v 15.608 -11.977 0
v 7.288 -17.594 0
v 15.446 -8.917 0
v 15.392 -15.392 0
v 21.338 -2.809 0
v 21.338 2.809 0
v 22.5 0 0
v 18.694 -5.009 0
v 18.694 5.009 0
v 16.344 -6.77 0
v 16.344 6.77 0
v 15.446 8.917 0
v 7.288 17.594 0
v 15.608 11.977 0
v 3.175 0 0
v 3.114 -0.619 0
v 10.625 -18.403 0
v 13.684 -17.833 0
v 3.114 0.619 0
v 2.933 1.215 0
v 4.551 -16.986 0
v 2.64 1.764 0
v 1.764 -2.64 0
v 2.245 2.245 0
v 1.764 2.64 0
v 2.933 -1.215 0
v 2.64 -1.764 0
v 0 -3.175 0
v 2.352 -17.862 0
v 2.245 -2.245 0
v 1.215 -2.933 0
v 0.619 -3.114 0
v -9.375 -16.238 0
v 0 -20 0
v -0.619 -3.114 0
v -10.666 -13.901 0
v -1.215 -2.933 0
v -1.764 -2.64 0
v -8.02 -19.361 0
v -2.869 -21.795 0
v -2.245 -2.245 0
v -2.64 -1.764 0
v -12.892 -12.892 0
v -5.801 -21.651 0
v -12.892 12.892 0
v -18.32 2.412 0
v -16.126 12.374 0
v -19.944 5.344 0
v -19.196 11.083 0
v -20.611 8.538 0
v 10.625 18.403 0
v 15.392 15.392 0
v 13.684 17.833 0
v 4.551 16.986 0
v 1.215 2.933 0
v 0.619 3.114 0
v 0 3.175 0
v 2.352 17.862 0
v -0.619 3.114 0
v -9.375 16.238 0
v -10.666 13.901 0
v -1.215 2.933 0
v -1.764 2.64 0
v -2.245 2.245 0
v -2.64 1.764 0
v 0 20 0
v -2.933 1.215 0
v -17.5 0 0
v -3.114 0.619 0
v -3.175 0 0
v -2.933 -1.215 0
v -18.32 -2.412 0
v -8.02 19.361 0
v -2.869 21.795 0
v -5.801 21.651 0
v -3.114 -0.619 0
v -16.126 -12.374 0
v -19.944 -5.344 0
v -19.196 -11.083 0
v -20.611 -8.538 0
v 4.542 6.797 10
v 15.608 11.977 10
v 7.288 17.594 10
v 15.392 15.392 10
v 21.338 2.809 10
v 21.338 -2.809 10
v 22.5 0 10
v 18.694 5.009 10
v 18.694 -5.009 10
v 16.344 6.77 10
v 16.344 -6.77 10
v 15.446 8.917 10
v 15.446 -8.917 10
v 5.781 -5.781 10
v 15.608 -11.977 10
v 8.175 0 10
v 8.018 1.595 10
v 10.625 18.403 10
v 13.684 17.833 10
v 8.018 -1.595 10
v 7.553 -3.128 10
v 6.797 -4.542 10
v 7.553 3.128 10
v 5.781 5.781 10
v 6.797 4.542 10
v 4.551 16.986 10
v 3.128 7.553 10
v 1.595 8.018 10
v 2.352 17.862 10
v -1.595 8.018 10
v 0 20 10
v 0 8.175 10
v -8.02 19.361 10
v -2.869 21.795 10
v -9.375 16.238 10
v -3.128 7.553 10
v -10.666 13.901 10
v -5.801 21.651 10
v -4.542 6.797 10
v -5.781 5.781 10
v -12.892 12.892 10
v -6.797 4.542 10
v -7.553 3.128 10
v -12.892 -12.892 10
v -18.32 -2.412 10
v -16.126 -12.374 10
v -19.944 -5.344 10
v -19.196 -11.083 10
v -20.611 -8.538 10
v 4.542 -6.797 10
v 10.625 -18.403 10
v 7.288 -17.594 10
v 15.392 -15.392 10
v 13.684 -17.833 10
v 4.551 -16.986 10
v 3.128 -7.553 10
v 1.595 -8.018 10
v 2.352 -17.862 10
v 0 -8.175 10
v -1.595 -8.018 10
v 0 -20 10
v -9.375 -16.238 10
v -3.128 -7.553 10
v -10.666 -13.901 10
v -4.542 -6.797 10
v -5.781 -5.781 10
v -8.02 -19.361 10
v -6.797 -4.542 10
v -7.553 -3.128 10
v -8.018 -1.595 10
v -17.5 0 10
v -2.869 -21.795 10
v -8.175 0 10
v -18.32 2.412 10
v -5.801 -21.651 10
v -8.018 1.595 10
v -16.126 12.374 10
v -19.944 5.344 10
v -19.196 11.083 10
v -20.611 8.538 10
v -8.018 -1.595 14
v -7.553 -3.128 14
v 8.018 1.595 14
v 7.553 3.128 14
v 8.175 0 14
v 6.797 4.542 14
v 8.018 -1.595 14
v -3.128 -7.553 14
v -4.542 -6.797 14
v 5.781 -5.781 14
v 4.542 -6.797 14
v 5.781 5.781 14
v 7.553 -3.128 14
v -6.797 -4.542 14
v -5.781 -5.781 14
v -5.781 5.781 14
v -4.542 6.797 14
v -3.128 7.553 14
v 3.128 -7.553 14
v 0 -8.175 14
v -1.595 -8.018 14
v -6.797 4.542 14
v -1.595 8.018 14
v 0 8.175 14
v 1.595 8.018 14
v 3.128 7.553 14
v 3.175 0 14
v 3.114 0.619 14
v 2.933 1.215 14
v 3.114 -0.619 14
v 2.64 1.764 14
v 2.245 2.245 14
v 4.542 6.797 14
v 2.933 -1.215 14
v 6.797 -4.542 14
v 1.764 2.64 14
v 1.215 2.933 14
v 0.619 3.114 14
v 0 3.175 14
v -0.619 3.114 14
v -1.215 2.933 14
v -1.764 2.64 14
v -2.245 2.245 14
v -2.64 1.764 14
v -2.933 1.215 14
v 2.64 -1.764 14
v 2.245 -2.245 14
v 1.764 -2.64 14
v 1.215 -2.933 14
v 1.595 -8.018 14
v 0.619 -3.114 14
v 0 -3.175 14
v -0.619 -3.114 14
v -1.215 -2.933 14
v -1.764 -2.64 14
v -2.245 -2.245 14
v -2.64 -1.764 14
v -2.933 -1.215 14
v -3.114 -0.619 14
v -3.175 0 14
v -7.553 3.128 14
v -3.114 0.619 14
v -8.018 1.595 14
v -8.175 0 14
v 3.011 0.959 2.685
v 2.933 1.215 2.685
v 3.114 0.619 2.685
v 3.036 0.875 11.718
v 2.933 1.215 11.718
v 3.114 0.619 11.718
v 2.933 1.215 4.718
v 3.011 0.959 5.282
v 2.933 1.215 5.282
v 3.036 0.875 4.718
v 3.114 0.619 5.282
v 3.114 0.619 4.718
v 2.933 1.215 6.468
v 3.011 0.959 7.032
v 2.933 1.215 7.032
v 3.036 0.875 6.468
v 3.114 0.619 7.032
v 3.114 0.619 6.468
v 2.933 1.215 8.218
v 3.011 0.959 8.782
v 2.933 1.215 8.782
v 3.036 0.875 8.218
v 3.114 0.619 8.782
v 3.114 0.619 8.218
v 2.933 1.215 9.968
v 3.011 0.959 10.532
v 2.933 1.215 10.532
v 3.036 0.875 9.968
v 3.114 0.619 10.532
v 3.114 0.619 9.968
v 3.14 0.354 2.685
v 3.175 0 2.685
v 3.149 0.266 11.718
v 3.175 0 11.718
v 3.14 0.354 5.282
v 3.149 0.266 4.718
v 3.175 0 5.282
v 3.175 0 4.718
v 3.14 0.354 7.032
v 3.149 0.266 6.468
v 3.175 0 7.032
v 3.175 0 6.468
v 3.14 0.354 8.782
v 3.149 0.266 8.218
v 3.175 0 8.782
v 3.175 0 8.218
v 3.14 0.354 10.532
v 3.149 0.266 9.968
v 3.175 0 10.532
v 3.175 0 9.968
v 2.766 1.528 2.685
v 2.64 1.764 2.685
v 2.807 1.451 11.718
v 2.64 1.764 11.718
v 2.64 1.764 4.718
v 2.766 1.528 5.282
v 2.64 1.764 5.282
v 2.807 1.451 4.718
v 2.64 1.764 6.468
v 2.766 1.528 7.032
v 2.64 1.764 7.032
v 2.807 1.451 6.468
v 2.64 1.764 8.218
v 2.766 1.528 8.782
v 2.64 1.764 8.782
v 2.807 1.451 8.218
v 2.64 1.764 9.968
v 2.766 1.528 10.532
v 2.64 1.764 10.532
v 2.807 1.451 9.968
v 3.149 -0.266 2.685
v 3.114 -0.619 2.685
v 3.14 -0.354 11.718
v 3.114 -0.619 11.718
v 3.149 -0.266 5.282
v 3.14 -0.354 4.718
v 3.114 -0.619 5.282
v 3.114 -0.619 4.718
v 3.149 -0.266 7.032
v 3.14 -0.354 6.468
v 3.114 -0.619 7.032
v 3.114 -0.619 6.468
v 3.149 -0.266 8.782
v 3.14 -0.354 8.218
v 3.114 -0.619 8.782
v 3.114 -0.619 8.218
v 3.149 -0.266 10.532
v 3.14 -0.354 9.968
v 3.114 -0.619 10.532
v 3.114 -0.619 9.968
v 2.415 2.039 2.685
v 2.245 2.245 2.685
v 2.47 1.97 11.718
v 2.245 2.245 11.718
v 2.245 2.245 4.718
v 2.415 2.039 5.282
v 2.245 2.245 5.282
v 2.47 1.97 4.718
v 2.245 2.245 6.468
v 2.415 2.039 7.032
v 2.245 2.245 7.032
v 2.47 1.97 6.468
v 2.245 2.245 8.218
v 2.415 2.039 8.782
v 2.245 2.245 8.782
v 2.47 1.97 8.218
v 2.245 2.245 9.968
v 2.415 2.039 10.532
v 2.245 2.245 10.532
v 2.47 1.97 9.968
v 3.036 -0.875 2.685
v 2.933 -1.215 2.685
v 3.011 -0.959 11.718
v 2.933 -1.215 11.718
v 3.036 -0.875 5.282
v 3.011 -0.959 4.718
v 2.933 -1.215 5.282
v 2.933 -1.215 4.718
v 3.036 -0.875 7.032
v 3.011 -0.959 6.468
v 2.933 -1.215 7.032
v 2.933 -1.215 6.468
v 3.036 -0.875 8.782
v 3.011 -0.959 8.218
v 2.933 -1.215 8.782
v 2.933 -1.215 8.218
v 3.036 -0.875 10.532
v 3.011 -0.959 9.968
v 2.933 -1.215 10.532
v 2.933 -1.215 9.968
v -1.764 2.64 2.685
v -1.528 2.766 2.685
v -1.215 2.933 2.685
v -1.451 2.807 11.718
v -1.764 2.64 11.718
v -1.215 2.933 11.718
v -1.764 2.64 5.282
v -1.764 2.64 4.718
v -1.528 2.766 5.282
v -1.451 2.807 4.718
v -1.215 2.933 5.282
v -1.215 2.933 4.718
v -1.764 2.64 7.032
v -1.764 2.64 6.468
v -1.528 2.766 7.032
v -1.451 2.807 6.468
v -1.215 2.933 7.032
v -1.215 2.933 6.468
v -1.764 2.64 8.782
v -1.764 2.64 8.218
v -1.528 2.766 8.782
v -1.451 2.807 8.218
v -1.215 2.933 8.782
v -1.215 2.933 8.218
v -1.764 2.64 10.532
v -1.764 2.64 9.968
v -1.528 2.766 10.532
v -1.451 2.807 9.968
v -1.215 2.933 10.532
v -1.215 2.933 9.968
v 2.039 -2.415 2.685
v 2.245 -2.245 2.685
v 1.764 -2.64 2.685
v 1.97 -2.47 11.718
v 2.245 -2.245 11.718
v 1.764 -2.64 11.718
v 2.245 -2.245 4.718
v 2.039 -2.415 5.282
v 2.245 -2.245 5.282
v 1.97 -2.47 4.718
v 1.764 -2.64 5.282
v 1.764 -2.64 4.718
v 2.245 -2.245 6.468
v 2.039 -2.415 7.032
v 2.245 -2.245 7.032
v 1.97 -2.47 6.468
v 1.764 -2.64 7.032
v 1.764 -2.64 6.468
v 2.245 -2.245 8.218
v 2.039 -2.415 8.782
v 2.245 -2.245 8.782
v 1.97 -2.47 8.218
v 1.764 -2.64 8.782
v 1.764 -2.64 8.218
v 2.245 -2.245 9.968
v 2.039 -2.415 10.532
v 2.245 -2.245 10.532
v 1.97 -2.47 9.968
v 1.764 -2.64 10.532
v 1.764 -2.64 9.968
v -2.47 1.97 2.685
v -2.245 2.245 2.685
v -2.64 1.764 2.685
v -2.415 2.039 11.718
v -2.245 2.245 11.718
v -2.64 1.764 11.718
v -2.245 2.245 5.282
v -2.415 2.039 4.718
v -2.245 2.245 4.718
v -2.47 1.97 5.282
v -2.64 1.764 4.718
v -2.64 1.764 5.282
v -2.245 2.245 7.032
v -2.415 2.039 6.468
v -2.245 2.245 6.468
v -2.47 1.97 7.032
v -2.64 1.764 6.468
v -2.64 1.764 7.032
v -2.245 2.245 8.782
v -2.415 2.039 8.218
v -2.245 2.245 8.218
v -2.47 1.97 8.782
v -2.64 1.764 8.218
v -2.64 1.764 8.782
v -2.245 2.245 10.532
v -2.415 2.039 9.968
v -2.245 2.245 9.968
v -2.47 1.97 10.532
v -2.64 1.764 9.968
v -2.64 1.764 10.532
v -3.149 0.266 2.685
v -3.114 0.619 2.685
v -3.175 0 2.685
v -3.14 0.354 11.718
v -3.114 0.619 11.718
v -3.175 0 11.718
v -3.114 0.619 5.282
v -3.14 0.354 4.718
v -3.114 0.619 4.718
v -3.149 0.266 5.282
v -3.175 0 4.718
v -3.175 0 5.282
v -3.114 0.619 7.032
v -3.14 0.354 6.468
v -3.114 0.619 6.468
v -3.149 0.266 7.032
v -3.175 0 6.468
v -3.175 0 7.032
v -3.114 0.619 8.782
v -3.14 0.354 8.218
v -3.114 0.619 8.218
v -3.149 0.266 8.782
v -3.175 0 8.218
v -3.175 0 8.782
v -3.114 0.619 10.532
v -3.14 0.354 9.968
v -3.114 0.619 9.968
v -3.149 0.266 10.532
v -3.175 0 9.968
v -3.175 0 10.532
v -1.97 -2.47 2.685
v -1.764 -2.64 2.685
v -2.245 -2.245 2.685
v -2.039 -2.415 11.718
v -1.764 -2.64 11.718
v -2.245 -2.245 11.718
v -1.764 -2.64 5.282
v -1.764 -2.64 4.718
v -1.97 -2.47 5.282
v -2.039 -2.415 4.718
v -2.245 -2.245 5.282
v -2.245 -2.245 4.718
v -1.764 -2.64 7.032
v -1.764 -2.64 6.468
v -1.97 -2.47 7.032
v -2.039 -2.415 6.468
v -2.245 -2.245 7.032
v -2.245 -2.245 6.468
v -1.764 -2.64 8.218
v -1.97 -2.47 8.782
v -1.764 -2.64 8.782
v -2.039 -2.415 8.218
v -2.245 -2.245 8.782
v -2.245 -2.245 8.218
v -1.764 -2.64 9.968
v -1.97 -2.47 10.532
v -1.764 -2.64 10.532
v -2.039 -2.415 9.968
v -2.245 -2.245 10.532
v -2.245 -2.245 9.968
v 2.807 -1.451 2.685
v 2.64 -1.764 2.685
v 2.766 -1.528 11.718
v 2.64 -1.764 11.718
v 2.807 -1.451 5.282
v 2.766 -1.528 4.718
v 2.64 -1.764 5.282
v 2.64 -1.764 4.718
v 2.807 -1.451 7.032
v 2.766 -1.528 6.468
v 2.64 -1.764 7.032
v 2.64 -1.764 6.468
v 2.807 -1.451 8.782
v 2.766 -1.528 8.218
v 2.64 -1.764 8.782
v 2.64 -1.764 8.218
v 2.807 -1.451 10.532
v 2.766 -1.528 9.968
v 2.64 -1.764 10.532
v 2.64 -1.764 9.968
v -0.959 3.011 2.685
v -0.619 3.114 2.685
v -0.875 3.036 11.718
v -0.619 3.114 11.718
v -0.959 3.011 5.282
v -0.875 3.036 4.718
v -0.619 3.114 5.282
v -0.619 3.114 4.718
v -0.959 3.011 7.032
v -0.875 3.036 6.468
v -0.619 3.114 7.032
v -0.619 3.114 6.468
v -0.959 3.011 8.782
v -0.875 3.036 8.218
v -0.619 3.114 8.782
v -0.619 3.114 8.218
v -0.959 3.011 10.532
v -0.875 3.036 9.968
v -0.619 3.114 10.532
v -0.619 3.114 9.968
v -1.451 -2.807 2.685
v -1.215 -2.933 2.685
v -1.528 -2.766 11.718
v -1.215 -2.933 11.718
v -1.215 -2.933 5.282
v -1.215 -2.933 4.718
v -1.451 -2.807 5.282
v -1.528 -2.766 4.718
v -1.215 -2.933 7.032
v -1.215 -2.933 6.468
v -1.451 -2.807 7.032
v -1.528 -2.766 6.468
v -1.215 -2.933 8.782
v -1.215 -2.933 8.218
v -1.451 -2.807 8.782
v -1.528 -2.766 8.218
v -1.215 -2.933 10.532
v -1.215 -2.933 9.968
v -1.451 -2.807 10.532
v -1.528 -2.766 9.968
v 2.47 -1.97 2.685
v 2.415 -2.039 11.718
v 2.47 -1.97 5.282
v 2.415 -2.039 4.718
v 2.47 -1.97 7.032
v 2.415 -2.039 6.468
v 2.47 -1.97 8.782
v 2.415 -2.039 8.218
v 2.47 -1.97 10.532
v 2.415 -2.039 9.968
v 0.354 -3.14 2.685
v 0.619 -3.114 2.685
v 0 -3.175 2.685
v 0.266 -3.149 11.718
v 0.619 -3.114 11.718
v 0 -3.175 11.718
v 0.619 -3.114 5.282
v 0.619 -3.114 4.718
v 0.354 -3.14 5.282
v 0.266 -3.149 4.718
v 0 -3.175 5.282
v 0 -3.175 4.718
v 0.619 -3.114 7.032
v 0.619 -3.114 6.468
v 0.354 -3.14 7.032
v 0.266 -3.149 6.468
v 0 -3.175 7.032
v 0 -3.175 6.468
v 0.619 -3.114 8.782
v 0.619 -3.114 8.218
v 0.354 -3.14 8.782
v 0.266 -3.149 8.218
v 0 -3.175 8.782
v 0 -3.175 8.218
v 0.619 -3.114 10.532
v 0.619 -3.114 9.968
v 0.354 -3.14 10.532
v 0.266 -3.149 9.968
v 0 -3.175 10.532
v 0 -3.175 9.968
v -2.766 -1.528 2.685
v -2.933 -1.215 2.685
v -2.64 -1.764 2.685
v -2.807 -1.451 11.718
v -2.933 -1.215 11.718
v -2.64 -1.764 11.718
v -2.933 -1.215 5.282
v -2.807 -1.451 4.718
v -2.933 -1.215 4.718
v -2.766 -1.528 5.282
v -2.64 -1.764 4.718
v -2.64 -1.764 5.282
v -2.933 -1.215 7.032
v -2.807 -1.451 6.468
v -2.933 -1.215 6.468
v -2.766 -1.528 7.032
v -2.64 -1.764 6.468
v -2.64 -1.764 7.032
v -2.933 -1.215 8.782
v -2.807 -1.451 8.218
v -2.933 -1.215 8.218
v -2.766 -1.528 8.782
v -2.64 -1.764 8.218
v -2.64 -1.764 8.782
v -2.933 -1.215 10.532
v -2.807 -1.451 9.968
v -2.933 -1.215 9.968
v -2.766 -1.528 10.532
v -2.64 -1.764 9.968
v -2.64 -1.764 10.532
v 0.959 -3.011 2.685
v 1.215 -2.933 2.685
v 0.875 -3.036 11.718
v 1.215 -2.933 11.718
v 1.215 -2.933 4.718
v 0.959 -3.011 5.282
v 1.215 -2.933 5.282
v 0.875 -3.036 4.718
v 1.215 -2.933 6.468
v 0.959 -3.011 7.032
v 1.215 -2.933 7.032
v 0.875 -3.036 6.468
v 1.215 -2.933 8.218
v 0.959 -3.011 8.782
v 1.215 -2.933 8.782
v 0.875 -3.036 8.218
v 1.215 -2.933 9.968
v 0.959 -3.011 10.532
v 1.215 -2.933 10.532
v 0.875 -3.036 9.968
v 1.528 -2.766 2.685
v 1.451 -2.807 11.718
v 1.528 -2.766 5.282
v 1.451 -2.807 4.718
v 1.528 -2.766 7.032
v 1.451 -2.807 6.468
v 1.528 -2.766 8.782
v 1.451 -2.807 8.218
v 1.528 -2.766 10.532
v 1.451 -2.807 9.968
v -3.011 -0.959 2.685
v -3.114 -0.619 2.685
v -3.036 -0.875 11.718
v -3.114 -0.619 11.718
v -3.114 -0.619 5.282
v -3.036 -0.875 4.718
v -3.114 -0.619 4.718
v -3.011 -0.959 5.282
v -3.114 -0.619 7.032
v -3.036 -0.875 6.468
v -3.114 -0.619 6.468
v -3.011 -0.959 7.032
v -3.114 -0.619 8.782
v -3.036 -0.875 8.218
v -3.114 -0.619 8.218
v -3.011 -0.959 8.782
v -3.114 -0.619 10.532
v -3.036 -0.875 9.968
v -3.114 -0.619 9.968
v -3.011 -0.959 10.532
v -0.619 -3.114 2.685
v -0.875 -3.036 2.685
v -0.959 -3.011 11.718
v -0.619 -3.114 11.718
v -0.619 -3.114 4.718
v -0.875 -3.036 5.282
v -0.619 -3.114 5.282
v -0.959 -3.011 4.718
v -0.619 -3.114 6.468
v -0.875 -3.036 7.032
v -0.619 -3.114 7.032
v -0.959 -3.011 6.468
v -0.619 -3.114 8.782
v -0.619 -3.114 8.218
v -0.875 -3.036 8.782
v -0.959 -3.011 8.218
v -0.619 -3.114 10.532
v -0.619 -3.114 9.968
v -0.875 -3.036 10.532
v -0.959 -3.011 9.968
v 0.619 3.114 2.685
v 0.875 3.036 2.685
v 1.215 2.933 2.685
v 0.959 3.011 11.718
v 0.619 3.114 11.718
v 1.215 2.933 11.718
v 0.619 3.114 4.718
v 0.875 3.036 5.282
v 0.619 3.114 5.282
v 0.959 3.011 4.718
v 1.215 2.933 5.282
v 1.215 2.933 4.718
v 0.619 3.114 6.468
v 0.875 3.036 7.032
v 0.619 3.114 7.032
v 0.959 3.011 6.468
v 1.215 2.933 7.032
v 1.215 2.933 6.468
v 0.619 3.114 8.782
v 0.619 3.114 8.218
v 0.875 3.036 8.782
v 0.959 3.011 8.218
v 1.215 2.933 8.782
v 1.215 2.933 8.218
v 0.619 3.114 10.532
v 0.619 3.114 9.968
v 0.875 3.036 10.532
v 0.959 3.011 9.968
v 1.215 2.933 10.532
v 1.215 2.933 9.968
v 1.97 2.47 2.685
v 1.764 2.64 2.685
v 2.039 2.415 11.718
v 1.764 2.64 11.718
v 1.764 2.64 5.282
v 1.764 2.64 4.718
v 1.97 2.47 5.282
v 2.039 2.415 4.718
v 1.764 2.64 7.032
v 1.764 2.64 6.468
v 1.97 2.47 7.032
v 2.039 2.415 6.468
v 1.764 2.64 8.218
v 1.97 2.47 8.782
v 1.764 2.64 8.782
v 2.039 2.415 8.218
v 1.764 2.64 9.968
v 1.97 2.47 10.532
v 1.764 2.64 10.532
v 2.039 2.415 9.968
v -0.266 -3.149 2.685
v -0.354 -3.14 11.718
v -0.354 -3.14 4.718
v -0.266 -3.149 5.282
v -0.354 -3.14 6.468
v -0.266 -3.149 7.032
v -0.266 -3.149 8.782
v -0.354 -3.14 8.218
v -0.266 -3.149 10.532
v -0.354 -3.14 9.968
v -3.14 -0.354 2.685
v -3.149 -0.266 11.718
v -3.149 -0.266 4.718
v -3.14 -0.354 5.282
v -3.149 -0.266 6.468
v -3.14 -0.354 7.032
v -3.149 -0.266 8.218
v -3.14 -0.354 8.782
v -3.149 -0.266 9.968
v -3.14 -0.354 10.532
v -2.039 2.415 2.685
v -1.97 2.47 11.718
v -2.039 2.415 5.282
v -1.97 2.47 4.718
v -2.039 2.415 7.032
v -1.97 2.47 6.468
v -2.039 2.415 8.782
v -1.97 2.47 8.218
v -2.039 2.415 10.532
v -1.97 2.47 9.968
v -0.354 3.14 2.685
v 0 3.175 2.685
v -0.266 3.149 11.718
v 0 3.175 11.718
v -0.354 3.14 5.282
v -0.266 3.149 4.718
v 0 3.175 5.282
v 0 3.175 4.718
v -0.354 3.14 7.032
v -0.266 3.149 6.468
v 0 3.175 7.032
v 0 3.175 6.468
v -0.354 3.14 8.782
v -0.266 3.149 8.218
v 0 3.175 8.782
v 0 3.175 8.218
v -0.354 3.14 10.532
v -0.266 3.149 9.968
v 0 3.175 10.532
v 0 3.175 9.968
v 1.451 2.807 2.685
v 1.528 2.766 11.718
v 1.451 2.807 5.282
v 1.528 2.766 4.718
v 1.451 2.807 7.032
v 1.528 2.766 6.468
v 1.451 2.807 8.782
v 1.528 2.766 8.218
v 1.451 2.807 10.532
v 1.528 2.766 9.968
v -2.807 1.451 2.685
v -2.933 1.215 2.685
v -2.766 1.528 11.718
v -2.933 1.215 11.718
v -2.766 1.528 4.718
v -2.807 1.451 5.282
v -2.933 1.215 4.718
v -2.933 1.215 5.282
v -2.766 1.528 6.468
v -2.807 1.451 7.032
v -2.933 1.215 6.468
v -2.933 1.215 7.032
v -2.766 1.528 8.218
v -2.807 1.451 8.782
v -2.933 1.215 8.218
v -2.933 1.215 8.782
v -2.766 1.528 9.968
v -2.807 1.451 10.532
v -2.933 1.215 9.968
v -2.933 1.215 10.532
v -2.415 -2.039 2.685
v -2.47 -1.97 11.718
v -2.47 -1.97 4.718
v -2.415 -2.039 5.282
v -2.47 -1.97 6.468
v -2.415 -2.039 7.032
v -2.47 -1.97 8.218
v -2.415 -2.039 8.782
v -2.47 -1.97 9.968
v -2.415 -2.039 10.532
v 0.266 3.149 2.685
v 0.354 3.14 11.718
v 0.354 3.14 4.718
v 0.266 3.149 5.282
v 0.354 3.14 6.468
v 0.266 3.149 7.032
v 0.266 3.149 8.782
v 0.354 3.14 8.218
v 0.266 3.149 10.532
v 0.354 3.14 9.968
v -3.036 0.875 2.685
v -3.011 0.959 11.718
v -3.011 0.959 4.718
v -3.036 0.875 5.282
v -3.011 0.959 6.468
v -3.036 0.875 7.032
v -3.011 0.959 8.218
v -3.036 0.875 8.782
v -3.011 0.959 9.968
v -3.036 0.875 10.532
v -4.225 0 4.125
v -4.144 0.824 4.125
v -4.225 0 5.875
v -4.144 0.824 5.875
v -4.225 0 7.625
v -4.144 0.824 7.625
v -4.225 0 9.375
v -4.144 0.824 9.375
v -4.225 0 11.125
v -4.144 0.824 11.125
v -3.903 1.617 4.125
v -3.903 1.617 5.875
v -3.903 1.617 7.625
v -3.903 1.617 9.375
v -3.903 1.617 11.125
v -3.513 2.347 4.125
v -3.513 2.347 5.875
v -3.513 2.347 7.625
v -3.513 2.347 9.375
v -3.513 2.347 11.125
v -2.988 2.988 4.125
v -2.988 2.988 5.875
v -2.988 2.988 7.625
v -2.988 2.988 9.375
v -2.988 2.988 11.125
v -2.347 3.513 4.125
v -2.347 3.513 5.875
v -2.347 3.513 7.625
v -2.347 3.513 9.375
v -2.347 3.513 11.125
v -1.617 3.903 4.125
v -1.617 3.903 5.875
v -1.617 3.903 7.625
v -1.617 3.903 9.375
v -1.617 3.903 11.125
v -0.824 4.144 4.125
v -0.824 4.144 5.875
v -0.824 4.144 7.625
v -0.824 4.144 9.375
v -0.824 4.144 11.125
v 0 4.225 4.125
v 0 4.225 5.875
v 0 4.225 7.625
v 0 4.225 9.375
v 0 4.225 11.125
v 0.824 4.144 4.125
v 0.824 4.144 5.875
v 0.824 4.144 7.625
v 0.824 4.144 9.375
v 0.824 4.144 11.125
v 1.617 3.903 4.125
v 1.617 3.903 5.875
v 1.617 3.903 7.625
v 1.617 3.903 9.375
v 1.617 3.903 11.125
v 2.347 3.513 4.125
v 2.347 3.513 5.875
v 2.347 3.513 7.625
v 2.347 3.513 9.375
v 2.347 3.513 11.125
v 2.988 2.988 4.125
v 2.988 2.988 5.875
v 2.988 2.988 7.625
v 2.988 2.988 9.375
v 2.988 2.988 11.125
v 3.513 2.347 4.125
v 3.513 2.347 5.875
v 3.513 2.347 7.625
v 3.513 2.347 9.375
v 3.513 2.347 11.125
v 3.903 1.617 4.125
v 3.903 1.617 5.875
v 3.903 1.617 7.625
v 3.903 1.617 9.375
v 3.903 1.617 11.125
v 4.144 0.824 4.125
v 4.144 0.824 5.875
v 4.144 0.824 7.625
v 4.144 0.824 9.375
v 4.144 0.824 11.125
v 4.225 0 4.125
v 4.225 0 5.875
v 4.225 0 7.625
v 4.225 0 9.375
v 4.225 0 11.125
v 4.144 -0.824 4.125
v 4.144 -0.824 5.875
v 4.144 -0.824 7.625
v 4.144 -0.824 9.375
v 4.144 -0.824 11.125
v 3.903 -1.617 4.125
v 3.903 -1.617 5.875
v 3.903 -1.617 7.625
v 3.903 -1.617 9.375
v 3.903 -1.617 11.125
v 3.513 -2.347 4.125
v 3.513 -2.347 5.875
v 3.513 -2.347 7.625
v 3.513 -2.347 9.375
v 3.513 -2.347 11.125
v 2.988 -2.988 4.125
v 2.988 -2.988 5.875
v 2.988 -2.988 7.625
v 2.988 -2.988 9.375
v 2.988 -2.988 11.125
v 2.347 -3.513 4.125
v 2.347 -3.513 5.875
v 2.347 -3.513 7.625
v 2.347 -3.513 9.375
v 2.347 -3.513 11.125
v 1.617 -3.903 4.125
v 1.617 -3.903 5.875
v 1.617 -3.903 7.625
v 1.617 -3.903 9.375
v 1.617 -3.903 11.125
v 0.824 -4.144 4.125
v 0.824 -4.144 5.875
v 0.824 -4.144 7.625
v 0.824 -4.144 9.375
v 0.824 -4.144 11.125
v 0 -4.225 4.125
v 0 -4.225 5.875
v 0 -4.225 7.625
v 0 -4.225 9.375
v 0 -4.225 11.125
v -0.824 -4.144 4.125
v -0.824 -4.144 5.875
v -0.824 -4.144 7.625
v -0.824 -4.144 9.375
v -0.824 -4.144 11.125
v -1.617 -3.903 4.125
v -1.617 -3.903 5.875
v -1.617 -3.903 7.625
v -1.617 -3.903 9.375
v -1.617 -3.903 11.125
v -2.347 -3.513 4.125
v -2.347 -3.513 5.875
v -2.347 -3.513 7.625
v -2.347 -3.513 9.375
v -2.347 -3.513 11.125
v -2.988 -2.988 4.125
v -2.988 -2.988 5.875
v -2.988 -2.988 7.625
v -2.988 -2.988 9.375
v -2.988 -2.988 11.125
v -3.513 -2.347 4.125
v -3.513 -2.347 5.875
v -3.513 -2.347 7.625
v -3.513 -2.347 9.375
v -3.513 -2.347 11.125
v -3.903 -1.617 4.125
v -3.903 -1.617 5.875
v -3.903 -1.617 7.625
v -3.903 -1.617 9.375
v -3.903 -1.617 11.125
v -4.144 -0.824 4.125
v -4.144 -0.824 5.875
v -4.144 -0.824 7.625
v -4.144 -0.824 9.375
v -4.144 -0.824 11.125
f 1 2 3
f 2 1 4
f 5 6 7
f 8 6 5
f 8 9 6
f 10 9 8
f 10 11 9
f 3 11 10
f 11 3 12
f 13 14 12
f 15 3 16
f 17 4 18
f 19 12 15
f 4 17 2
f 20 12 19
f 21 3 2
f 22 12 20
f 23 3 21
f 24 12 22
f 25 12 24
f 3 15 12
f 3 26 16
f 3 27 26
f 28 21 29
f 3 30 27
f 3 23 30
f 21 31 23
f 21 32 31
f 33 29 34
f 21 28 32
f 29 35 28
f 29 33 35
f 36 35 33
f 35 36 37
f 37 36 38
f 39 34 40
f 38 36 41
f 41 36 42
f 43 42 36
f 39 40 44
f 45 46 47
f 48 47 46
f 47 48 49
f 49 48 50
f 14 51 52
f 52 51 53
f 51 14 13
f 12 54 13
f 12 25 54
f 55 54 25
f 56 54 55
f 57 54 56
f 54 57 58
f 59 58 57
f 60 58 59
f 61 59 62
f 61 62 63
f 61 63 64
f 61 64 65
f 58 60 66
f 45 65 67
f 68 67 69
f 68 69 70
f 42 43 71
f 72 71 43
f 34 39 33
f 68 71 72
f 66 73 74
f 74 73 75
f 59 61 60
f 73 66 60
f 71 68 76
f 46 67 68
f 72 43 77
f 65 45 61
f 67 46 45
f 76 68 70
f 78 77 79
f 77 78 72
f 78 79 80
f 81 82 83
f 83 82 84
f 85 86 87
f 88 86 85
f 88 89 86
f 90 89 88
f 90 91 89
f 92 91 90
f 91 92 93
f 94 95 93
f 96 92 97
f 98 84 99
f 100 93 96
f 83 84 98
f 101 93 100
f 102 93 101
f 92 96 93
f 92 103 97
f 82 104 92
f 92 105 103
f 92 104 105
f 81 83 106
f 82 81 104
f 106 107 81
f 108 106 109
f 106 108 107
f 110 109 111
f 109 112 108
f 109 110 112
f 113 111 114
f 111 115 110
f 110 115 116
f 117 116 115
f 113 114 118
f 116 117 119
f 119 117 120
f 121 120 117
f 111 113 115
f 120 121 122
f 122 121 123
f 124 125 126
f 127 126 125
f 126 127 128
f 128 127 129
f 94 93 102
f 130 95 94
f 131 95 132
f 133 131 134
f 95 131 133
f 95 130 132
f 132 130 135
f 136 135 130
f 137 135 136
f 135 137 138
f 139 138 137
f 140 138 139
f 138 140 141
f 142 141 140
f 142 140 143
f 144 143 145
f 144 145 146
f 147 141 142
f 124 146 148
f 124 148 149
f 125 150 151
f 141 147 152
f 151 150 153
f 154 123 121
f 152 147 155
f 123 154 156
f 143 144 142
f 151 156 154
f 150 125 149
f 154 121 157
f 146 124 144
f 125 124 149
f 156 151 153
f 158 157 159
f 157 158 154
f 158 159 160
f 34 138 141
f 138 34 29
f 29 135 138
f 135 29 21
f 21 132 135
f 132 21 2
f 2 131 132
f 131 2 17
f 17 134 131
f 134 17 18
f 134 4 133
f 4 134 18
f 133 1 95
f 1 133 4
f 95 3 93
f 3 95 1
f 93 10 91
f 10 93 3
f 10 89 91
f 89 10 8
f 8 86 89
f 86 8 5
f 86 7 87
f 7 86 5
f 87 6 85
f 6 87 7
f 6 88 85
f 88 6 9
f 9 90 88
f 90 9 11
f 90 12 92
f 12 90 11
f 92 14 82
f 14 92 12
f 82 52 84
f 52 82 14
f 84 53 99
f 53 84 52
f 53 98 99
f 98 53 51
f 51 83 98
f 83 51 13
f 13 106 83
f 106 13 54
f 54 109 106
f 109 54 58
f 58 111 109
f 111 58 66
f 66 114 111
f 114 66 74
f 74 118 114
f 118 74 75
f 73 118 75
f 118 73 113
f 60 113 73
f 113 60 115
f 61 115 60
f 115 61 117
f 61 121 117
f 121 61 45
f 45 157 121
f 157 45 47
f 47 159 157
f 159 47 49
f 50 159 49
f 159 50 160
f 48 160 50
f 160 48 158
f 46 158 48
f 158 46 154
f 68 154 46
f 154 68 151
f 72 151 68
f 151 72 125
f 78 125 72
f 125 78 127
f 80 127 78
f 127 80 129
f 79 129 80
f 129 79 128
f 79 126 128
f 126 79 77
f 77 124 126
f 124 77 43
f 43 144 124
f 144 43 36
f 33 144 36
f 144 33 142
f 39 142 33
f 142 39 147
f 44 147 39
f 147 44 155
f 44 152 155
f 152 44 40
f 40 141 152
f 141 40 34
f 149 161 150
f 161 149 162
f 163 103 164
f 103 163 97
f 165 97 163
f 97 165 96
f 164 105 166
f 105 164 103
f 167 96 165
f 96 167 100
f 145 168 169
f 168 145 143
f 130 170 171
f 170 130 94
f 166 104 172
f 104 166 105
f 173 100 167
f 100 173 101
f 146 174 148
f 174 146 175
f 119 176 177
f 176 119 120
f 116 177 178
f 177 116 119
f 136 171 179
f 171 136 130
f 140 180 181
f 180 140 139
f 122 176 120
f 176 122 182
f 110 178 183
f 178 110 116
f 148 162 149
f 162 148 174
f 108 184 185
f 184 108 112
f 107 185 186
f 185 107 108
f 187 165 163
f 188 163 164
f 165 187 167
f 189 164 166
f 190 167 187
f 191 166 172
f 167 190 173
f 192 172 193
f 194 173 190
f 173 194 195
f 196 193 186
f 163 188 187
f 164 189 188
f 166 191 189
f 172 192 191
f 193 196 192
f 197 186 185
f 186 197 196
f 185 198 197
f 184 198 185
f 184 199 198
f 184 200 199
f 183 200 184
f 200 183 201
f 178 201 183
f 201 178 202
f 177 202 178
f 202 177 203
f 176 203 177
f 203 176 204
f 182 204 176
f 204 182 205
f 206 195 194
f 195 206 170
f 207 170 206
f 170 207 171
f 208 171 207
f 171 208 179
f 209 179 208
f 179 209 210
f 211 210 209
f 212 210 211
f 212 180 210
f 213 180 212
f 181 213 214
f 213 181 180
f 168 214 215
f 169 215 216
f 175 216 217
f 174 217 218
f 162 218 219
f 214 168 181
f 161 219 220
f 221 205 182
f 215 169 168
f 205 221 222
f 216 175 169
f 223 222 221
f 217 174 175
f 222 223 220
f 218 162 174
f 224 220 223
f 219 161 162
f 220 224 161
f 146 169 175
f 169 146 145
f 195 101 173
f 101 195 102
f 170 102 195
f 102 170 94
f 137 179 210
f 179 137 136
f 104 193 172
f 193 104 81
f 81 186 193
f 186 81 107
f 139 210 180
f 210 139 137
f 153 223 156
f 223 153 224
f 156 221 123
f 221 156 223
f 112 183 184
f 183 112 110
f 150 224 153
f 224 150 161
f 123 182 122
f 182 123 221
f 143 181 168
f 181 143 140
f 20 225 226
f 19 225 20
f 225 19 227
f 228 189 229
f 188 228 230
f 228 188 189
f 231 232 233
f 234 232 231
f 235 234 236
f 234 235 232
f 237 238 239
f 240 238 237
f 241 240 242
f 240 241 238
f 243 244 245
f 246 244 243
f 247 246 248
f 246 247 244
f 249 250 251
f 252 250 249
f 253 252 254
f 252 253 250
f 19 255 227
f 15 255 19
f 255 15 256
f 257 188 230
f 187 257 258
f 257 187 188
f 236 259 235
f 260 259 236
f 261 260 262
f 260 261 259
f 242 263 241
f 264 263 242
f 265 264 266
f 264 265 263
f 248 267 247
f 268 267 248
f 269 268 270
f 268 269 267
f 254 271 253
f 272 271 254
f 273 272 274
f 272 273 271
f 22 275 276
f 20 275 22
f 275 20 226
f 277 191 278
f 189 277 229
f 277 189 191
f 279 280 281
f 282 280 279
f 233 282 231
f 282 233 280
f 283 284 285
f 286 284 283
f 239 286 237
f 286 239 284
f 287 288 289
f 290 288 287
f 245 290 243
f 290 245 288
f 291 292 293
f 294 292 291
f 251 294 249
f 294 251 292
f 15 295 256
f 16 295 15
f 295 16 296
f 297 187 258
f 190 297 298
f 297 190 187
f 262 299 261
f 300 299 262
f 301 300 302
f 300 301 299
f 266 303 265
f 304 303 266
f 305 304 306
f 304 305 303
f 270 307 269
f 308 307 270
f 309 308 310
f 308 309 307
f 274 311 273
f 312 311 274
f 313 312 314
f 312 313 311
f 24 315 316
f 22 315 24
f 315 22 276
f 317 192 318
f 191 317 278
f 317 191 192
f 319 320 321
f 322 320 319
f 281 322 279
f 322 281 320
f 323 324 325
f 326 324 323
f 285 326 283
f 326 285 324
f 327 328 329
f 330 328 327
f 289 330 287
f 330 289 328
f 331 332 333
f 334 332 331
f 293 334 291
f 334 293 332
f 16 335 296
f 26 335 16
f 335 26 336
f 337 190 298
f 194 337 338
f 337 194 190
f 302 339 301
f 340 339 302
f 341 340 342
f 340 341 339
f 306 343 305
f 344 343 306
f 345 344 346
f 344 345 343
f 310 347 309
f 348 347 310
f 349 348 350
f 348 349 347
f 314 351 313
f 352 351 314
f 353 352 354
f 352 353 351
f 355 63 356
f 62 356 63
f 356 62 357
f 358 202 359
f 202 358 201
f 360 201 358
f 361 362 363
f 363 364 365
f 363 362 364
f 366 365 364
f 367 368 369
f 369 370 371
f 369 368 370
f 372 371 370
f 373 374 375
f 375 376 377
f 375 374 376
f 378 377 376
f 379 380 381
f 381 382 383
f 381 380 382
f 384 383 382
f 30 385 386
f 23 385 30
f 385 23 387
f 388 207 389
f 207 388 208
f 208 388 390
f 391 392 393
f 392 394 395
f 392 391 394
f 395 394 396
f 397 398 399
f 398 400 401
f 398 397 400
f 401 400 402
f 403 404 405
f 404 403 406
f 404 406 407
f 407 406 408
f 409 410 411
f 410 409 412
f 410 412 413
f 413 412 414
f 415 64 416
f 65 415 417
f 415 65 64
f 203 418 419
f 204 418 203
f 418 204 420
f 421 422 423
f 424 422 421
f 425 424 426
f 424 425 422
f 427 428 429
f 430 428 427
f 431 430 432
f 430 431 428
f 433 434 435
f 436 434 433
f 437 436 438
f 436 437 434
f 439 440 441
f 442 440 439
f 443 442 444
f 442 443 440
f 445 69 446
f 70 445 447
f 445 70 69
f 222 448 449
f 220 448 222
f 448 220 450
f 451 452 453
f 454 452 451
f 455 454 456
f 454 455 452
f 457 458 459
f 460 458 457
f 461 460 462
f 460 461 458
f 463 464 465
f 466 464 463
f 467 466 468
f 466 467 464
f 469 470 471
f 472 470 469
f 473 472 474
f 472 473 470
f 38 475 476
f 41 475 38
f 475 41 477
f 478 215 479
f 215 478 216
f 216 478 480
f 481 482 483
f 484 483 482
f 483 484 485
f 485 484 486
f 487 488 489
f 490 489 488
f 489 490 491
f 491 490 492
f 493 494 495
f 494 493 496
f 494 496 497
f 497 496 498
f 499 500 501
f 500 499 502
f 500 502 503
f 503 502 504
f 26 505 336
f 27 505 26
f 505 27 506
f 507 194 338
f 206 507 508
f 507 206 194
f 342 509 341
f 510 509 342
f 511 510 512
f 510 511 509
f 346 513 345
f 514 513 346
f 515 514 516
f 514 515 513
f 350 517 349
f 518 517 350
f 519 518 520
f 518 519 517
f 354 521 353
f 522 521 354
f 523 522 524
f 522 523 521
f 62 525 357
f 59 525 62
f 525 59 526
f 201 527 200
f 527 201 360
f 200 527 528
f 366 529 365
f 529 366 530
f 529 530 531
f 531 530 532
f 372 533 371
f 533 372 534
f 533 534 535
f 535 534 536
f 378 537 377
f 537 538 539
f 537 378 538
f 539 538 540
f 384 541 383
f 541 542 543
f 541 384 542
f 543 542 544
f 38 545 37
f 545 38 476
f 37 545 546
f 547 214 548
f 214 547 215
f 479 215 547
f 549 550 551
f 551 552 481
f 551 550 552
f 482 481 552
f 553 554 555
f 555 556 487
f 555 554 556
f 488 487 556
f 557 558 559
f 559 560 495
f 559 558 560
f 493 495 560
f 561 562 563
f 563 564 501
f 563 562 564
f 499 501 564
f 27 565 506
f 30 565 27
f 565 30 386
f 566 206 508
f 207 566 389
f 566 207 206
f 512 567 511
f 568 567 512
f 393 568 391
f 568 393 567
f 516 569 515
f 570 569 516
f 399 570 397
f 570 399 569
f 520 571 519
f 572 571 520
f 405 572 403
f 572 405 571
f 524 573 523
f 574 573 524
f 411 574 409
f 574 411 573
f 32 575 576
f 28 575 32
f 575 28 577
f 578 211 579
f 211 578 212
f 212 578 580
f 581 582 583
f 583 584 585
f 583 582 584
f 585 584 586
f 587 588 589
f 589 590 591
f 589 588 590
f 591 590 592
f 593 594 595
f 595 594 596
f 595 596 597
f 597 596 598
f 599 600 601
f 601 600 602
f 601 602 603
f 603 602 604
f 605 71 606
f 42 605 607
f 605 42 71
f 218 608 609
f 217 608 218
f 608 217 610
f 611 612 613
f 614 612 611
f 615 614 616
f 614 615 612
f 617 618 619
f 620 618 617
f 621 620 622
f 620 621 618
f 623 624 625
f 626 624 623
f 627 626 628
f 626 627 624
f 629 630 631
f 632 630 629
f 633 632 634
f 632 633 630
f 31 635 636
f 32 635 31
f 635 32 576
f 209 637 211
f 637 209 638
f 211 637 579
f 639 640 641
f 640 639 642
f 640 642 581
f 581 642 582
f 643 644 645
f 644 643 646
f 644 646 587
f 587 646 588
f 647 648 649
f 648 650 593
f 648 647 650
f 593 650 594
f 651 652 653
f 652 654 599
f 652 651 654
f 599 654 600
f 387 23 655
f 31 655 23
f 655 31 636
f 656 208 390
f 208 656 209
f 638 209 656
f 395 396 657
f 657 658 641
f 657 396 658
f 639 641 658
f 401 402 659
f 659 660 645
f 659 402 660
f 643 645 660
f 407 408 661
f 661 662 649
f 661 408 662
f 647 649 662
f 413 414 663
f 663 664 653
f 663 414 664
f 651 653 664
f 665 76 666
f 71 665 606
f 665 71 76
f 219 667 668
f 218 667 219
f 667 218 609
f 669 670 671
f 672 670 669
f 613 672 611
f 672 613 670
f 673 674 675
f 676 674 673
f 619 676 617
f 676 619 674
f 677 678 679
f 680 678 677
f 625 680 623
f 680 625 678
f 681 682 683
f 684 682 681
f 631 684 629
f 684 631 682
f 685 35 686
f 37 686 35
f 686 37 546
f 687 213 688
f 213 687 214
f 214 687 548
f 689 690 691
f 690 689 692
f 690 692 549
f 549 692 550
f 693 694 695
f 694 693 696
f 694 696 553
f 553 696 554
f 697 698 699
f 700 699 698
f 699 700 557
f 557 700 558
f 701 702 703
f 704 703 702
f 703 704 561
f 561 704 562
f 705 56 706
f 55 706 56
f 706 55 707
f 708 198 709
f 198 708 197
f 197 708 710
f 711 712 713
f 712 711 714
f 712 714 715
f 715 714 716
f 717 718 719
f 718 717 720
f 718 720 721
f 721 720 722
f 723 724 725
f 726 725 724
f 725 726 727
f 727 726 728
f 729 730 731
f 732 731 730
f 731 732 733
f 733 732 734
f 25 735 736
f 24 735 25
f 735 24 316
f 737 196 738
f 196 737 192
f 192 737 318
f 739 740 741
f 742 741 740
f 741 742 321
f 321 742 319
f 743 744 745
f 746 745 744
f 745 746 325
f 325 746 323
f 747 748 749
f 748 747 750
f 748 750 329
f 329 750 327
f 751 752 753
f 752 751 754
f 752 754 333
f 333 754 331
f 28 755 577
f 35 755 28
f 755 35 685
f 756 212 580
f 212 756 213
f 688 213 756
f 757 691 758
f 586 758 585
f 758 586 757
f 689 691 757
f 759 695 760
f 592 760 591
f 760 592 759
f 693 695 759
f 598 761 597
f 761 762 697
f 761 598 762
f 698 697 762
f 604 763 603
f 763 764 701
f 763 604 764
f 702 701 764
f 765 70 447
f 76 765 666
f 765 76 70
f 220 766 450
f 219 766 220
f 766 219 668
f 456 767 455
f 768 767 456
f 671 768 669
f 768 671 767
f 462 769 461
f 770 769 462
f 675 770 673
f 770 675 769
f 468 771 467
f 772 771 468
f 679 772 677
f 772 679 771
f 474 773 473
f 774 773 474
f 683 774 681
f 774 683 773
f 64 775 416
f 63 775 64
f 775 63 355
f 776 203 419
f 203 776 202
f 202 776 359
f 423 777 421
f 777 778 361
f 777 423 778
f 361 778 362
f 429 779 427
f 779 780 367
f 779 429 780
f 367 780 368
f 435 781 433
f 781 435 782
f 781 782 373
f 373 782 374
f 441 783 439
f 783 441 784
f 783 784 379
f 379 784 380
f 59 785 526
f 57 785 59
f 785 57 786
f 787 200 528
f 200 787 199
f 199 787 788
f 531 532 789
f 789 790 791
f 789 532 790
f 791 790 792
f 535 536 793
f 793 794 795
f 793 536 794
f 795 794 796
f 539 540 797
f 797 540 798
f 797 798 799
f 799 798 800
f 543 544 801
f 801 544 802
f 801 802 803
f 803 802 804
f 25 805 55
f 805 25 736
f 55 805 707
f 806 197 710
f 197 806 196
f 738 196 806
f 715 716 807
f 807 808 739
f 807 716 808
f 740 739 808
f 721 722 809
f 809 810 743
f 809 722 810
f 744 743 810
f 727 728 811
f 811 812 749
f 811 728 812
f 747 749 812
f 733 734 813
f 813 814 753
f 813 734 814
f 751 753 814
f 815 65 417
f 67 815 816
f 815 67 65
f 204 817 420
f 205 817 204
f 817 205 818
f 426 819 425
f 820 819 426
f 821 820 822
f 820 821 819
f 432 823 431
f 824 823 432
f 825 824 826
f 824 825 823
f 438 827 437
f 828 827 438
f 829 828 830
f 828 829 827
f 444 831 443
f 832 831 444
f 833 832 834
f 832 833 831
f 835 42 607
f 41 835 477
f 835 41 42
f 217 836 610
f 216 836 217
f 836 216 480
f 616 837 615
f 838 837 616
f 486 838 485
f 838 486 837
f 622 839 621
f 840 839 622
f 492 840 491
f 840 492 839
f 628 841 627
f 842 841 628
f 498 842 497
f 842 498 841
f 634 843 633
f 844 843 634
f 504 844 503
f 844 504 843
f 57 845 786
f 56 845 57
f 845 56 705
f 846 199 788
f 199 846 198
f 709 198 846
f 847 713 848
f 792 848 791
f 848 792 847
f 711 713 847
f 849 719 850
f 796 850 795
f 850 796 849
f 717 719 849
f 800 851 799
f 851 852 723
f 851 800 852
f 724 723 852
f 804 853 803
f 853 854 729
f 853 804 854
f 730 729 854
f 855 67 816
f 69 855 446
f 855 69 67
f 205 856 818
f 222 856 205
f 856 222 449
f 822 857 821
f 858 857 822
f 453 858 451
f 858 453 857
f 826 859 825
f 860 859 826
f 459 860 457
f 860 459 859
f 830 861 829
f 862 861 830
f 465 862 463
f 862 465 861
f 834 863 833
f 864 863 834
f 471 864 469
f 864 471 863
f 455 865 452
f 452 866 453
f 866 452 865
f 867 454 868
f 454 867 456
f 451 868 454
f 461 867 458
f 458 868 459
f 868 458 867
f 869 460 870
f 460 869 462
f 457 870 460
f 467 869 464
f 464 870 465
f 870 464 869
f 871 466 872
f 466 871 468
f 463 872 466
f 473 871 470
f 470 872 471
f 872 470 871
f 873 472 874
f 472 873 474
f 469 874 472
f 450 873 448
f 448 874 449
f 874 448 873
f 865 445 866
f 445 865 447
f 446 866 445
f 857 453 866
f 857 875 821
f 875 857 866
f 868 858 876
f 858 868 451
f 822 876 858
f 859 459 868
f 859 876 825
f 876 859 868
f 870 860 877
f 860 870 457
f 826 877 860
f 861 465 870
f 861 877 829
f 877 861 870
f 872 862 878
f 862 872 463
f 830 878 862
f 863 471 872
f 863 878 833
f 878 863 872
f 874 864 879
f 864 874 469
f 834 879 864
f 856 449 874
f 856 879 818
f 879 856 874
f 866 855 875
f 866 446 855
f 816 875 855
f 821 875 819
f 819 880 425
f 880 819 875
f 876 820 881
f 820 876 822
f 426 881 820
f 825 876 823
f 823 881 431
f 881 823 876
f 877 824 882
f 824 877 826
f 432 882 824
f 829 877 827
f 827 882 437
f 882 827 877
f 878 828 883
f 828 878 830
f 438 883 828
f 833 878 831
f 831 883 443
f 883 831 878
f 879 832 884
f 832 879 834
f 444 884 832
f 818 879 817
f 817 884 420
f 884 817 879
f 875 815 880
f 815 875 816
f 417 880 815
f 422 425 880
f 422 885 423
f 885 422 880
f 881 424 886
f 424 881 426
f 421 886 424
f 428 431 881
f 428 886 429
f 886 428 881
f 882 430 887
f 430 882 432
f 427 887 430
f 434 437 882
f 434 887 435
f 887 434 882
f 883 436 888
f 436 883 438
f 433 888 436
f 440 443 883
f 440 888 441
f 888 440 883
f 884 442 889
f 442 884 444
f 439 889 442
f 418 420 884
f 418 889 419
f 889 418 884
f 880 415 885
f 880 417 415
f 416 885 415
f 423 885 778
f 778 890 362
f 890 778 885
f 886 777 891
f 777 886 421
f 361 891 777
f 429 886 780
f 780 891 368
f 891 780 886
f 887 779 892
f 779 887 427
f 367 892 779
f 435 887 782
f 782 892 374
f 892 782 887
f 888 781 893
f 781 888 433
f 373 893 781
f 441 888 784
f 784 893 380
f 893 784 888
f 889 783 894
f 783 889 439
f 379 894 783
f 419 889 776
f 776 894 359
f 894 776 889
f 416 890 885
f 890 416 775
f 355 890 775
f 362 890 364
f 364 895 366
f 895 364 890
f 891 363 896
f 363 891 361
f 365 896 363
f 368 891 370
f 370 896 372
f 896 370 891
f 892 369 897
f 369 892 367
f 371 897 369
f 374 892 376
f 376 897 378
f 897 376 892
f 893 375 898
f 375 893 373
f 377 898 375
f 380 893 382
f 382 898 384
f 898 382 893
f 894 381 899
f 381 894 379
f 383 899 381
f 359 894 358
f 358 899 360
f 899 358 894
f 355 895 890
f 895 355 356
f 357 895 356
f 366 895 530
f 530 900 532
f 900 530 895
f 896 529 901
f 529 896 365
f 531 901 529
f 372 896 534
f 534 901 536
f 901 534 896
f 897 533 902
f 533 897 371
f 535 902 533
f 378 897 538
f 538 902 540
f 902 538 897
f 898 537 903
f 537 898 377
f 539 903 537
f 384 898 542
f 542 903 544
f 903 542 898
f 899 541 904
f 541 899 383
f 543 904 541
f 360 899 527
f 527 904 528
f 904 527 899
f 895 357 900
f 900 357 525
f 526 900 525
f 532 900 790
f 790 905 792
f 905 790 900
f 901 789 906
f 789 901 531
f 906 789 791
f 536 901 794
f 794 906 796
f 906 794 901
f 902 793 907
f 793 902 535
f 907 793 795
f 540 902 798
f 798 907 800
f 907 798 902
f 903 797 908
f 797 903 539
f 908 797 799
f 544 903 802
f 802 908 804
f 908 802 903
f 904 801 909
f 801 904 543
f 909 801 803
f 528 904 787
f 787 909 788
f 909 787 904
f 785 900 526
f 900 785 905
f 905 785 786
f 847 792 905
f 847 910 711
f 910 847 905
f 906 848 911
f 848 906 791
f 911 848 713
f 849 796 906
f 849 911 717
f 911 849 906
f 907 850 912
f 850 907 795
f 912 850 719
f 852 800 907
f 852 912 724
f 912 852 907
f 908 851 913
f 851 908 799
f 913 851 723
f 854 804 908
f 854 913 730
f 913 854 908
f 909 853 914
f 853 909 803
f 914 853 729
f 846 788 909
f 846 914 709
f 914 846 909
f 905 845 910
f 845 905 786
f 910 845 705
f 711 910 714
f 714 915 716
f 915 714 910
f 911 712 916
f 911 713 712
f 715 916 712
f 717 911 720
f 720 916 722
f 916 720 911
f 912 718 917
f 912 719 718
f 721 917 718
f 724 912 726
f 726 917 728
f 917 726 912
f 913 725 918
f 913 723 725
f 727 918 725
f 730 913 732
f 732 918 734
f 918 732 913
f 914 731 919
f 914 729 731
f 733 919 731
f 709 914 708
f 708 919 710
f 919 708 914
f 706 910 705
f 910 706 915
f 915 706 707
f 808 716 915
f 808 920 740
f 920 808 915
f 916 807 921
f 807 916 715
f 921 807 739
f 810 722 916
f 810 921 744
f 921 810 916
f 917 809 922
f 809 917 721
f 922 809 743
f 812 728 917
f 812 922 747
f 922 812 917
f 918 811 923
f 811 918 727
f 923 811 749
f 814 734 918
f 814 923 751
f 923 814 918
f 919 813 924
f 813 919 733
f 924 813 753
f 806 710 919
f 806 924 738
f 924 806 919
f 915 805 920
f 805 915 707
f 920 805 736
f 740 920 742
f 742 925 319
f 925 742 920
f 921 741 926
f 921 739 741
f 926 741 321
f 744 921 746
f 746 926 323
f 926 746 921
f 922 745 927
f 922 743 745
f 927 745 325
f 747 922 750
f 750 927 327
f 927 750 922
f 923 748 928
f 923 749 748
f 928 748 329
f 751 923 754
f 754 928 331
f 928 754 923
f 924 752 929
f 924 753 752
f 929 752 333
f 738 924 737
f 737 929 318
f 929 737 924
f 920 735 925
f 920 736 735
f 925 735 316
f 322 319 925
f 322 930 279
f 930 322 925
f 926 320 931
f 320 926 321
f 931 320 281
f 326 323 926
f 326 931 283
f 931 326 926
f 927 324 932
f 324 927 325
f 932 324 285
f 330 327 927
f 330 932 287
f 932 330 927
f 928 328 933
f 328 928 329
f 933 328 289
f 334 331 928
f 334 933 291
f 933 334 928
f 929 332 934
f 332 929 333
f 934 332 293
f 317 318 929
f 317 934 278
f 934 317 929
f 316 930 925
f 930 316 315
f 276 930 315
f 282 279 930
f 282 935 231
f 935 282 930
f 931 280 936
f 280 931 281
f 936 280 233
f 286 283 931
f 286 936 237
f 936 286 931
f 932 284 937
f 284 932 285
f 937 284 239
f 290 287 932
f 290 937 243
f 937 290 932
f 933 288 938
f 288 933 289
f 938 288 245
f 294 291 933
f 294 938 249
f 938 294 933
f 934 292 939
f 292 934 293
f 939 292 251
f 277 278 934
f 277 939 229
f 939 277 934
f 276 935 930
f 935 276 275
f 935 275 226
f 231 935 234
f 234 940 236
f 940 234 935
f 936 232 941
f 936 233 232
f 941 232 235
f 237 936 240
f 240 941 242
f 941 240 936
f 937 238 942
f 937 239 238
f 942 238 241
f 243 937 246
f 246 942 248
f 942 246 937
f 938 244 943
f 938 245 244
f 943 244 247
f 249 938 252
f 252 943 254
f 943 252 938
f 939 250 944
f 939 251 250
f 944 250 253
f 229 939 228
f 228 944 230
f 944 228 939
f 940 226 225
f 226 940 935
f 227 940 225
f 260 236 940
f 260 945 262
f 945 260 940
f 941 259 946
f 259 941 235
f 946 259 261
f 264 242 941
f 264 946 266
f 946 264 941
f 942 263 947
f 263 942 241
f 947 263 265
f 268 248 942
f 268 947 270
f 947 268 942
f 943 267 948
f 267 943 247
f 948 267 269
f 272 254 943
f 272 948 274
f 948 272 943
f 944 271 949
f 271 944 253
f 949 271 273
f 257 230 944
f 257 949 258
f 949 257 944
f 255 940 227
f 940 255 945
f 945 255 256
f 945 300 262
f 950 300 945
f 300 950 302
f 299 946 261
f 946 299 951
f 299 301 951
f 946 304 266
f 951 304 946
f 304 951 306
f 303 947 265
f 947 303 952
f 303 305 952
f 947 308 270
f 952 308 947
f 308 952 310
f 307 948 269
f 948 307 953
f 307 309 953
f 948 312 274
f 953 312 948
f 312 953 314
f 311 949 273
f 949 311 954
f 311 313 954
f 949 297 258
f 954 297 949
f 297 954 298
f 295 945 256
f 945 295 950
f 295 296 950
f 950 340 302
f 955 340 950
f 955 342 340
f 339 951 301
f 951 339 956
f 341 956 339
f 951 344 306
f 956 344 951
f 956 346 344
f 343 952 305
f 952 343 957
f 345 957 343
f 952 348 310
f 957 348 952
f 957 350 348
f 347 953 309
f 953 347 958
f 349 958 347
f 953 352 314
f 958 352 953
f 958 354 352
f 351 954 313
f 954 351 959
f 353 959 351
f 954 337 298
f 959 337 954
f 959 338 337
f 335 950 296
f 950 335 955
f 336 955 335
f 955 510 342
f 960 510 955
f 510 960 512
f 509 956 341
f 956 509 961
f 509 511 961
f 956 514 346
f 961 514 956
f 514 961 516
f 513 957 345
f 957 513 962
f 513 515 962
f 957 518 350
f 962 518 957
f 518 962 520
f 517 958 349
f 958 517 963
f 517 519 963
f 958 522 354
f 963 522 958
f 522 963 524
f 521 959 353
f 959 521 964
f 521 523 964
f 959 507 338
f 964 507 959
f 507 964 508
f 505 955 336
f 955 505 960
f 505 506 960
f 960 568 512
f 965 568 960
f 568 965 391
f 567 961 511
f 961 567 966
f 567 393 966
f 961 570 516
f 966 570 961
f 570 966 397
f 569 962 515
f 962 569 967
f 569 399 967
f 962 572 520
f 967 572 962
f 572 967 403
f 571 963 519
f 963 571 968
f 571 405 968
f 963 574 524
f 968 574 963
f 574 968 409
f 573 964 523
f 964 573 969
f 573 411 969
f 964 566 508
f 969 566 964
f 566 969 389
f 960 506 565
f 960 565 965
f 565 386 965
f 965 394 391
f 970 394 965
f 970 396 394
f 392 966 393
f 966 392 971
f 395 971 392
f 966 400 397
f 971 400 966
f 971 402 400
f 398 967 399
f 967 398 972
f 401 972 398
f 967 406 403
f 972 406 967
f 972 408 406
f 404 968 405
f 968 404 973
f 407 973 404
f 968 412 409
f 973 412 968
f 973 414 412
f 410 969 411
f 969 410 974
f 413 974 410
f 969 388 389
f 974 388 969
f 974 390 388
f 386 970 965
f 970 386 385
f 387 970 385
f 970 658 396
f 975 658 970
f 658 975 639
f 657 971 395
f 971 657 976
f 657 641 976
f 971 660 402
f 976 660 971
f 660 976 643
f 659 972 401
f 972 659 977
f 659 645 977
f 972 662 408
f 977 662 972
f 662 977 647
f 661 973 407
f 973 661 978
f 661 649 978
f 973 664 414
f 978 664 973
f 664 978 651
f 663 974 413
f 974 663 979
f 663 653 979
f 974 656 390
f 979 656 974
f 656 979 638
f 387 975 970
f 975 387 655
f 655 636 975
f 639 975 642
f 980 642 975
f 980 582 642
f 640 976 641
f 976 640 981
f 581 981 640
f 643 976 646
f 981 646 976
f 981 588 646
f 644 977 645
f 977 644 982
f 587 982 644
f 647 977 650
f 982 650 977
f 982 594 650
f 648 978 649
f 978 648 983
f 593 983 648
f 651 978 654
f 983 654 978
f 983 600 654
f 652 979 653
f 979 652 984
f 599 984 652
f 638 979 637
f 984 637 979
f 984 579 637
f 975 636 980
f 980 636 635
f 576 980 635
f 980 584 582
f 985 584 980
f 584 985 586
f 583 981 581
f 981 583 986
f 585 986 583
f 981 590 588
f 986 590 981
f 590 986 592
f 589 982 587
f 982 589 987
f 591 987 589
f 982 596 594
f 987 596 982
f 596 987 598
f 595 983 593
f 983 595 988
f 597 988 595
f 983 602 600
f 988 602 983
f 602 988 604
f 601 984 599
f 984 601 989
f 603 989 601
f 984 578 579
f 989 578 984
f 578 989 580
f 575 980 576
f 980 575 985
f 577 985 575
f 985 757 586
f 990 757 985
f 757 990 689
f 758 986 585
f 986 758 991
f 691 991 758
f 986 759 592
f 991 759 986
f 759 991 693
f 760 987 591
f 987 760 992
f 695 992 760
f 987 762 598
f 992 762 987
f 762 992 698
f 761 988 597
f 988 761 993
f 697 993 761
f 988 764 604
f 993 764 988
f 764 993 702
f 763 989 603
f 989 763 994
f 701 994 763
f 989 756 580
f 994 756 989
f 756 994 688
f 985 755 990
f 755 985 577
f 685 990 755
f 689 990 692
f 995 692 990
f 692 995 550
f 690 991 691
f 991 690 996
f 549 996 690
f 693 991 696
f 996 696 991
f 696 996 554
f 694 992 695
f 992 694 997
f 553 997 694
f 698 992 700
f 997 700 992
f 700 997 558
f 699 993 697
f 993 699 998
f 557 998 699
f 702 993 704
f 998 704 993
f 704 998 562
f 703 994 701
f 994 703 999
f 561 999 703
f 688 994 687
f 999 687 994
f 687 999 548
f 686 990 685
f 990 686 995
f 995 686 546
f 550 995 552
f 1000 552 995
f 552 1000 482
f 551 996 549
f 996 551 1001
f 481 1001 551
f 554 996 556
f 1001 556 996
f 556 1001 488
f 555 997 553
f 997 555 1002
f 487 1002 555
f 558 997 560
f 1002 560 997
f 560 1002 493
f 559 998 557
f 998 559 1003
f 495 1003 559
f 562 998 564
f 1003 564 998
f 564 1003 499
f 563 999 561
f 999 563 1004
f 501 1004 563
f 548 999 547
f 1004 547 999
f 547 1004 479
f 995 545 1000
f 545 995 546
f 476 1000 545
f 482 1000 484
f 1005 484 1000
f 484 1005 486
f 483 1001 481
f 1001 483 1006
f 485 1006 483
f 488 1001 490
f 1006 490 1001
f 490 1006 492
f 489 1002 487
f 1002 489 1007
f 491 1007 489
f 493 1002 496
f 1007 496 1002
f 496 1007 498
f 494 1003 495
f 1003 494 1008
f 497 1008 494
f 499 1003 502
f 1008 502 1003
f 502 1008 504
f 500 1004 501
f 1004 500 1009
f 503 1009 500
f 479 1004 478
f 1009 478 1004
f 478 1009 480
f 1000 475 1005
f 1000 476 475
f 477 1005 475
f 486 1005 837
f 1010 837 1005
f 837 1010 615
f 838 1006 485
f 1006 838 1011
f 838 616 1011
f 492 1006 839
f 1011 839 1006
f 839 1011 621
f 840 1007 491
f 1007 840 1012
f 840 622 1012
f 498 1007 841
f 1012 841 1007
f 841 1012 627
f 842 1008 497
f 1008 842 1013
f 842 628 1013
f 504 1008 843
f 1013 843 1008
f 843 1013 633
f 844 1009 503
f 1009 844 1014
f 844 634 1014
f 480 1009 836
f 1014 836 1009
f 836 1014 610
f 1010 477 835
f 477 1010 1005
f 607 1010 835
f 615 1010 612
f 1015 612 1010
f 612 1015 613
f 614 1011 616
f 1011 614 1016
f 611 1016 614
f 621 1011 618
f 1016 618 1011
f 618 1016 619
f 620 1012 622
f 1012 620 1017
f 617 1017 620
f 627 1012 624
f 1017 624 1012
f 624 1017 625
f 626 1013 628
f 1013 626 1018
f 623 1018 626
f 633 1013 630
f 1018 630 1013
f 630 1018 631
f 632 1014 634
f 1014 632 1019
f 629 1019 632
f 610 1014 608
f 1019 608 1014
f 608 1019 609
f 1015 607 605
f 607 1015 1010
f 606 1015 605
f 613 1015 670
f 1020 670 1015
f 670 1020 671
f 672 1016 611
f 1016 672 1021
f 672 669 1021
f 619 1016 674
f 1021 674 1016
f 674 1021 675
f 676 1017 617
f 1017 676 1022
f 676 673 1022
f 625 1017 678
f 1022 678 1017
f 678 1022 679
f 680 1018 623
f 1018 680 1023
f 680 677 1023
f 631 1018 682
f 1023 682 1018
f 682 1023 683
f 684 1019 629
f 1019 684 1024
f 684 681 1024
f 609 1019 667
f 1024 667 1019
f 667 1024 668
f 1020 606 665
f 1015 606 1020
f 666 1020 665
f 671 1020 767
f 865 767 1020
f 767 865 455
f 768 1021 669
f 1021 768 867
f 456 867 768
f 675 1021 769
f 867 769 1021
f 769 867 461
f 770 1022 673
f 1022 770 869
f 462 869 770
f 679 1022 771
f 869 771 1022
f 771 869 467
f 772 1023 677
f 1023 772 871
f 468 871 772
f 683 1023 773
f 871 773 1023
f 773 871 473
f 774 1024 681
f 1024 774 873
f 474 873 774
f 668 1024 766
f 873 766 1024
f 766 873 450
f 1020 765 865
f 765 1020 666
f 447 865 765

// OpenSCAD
$fn = 32;

// ----------------------------------------------------------------------
// Thumb nut: 7 lobe grip, 14 mm tall, M6.35 thread
// ----------------------------------------------------------------------

// --- parameters (mm) ---
base_r = 20;              // grip base radius
lobe_amp = 2.5;           // lobe height above the base radius
lobes = 7;                // number of grip lobes
grip_h = 10;              // grip height
boss_d = 16.35;           // threaded boss diameter
boss_h = 4;               // boss height
bore_d = 6.35;            // thread core diameter
pitch = 1.75;             // thread pitch
thread_d = 1.05;          // thread depth

grip = [[22.5, 0], [21.338, 2.809], [18.694, 5.009], [16.344, 6.77], [15.446, 8.917], [15.608, 11.977], [15.392, 15.392], [13.684, 17.833], [10.625, 18.403], [7.288, 17.594], [4.551, 16.986], [2.352, 17.862], [0, 20], [-2.869, 21.795], [-5.801, 21.651], [-8.02, 19.361], [-9.375, 16.238], [-10.666, 13.901], [-12.892, 12.892], [-16.126, 12.374], [-19.196, 11.083], [-20.611, 8.538], [-19.944, 5.344], [-18.32, 2.412], [-17.5, 0], [-18.32, -2.412], [-19.944, -5.344], [-20.611, -8.538], [-19.196, -11.083], [-16.126, -12.374], [-12.892, -12.892], [-10.666, -13.901], [-9.375, -16.238], [-8.02, -19.361], [-5.801, -21.651], [-2.869, -21.795], [0, -20], [2.352, -17.862], [4.551, -16.986], [7.288, -17.594], [10.625, -18.403], [13.684, -17.833], [15.392, -15.392], [15.608, -11.977], [15.446, -8.917], [16.344, -6.77], [18.694, -5.009], [21.338, -2.809]];

difference() {
  union() {
    /* grip outline extruded straight up */
    linear_extrude(height = grip_h) polygon(grip);
    /* boss sunk half a millimetre into the grip */
    translate([0, 0, grip_h - 0.5]) cylinder(h = boss_h + 0.5, d = boss_d);
  }
  /* threaded bore through grip and boss */
  translate([0, 0, -2.5]) cylinder(h = grip_h + boss_h + 5, d = bore_d);
  translate([0, 0, 2.0]) rotate_extrude() polygon([[2.175, 0], [2.175, 10], [2.675, 10], [4.225, 9.125], [2.675, 8.25], [4.225, 7.375], [2.675, 6.5], [4.225, 5.625], [2.675, 4.75], [4.225, 3.875], [2.675, 3], [4.225, 2.125], [2.675, 0], [2.175, 0]]);
}
